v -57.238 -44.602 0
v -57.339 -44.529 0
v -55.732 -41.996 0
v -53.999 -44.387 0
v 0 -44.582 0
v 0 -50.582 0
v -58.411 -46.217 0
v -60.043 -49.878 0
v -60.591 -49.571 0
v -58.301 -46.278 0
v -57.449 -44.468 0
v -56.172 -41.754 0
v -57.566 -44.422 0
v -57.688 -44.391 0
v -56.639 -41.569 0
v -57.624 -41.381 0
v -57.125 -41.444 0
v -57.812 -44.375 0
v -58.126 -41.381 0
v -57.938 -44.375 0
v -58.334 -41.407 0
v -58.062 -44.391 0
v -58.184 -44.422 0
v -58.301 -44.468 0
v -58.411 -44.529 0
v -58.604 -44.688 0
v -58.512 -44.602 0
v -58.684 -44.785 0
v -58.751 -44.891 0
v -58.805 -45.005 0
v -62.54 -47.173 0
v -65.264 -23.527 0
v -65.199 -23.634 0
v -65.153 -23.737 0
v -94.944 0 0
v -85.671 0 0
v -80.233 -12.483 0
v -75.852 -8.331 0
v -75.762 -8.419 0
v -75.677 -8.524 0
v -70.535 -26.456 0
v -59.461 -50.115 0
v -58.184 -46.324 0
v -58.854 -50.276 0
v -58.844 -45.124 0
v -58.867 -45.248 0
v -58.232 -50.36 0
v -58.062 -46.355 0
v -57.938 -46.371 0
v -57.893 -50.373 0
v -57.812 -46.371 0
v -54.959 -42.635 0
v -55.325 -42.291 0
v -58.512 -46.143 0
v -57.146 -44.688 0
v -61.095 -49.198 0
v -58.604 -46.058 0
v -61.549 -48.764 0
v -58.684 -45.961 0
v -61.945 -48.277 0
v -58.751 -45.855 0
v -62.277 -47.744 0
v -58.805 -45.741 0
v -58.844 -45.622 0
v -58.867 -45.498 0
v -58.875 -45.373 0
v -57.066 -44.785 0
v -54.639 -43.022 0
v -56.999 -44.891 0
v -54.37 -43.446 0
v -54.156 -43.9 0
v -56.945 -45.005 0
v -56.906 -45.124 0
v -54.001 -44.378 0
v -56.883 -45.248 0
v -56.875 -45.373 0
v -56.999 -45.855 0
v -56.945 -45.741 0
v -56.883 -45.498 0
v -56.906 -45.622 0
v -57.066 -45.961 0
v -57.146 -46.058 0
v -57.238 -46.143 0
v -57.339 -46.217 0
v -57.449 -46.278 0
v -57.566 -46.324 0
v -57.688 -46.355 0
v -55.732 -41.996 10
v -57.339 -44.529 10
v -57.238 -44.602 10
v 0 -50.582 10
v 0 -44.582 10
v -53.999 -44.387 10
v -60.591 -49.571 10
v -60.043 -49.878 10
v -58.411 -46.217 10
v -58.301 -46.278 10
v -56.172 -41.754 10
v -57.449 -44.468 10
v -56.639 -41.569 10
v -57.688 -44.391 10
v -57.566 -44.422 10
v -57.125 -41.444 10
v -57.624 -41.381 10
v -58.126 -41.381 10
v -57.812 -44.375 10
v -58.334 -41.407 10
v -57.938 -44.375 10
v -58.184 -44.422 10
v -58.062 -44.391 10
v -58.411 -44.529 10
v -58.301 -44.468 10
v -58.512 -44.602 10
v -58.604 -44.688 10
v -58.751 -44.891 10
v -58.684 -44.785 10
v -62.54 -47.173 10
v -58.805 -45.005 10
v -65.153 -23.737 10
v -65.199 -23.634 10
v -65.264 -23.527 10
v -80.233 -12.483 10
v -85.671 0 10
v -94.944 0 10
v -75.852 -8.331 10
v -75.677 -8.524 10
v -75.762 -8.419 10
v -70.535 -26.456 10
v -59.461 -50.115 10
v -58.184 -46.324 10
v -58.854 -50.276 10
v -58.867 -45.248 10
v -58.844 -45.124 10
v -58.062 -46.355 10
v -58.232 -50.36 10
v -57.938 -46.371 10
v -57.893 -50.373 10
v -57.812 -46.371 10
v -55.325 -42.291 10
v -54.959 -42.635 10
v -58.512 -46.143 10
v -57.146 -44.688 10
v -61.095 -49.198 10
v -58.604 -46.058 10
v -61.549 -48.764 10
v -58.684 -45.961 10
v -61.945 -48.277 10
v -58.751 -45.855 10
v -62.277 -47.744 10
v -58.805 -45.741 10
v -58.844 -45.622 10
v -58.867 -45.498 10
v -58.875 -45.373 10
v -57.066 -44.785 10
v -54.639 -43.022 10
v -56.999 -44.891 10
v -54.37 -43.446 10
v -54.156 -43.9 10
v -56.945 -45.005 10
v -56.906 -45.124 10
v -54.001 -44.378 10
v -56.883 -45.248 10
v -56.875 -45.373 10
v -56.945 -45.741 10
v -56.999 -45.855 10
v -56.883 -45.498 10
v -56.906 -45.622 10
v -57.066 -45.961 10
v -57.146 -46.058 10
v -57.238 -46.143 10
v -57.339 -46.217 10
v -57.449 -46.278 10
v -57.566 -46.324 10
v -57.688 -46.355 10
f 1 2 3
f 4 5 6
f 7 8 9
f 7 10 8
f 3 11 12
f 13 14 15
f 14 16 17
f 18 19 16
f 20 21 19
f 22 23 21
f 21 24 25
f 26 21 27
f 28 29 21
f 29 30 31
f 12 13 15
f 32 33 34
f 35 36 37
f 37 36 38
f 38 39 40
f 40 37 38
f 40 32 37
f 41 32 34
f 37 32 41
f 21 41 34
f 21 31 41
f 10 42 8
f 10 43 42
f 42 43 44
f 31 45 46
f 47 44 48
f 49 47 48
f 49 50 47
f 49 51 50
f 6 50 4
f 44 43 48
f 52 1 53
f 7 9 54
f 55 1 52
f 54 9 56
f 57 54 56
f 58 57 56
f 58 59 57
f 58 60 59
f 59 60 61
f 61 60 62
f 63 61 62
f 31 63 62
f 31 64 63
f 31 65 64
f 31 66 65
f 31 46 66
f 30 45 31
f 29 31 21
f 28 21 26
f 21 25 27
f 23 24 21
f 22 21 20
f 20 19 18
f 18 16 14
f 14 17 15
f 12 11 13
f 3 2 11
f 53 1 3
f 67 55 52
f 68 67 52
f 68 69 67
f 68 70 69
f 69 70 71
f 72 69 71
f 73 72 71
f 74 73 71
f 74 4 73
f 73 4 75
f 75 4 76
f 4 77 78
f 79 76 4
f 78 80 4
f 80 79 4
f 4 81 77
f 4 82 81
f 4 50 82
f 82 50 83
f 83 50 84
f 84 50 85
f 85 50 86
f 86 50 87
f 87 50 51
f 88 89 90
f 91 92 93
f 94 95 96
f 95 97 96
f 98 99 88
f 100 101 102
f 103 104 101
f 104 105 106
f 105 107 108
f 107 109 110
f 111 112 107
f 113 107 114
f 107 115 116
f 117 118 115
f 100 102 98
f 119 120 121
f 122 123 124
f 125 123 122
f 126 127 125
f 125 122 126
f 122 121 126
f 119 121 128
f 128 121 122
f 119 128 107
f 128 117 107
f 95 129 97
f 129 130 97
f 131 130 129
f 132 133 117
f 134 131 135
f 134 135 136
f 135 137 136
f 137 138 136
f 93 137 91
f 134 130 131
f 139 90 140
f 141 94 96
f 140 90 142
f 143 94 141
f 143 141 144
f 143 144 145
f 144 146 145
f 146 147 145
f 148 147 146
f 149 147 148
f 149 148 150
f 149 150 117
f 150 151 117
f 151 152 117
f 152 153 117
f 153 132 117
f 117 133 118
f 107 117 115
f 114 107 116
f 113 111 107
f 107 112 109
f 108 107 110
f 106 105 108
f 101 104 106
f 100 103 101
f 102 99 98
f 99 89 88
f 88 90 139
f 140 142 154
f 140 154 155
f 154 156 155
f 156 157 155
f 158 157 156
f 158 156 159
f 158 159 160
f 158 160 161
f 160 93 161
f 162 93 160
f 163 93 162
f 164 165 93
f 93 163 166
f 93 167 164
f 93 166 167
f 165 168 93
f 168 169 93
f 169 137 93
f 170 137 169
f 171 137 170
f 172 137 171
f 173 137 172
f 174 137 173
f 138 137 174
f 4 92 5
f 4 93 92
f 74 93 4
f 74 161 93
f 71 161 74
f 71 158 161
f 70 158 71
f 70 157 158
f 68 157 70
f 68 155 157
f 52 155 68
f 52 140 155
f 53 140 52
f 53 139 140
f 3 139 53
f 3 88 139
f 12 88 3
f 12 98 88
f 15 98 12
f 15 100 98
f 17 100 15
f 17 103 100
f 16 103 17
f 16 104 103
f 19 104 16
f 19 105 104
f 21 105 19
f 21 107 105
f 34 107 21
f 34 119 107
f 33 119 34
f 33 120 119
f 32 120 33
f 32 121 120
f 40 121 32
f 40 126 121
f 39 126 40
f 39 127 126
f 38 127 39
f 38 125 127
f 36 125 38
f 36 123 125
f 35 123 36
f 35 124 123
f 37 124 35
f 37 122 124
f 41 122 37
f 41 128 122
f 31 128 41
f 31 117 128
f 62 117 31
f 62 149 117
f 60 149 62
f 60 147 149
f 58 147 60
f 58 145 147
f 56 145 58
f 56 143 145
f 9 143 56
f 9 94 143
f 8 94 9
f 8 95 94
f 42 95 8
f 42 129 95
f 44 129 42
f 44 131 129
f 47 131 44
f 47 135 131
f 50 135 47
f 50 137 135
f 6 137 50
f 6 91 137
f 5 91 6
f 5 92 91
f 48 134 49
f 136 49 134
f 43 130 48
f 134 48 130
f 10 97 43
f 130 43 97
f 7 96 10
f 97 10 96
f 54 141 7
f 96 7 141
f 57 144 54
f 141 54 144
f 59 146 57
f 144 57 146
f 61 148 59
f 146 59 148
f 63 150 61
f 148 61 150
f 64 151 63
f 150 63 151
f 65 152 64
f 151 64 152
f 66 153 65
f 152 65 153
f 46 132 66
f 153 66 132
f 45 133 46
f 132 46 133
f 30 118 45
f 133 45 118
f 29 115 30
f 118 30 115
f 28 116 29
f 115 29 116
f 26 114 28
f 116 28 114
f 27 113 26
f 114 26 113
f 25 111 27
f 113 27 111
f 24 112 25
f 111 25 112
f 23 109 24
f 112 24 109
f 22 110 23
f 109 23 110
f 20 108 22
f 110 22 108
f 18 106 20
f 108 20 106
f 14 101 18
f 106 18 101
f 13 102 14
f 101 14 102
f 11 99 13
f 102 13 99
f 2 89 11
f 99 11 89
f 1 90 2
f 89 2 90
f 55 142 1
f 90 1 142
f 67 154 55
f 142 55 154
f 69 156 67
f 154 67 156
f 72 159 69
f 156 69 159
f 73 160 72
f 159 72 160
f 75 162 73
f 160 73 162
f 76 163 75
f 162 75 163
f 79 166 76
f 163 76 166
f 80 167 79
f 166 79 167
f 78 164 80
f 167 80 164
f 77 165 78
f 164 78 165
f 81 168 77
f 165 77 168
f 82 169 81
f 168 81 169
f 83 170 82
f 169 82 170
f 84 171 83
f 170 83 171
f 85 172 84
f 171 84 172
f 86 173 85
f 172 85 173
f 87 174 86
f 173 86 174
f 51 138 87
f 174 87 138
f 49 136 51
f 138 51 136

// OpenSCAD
// file: ../../../../../hardware/openscad/keyboard-builder.scad
// -*- mode: c -*-


// All distances are in mm.


// ********** CONSTANTS **********
keycap_size             = 18;
mx_hole_size            = 13.97;
mx_notch_width          = 3.5001;
mx_notch_offset         = 4.2545;
mx_notch_depth          = 0.8128;


// ********** GLOBAL VARIABLES **********
DEBUG                   = true;
mx_notched_holes        = true;



// ********** MODULES **********


module mx_switch_hole() {
    // Cherry MX switch hole with the center at `position`.
    // Sizes come from the ErgoDox design.

    union() {
        square([mx_hole_size, mx_hole_size], center=true);
        if (mx_notched_holes) {
            translate([0, mx_notch_offset]) {
                square([mx_hole_size + 2 * mx_notch_depth, mx_notch_width], center=true);
            }
            translate([0, -mx_notch_offset]) {
                square([mx_hole_size + 2 * mx_notch_depth, mx_notch_width], center=true);
            }
        }
    }
//    _debug_rectangle(keycap_size * keycap[0] + floor(keycap[0] - 1), keycap_size * keycap[1] + floor(keycap[1] - 1));
}


module keycap(keycap) {
    width = keycap_size * keycap[0] + floor(keycap[0] - 1);
    height = keycap_size * keycap[1] + floor(keycap[1] - 1);
    square([width, height], center=true);
}


module quadrant_split(origin, quadrant_number) {
    translate(origin) {
        intersection() {
            translate(-origin) {
                children();
            }
            rotate([0, 0, quadrant_number * 90]) {
                square([1000, 1000]);
            }
        }
    }
}
// main file
include <dmach76.scad>;

linear_extrude(height=10)
quadrant_split([0, 0], 2)
union() {difference() {offset(r=5) bottom_plate(); offset(r=-1) bottom_plate(); screw_holes(); }; screw_washers(); }
